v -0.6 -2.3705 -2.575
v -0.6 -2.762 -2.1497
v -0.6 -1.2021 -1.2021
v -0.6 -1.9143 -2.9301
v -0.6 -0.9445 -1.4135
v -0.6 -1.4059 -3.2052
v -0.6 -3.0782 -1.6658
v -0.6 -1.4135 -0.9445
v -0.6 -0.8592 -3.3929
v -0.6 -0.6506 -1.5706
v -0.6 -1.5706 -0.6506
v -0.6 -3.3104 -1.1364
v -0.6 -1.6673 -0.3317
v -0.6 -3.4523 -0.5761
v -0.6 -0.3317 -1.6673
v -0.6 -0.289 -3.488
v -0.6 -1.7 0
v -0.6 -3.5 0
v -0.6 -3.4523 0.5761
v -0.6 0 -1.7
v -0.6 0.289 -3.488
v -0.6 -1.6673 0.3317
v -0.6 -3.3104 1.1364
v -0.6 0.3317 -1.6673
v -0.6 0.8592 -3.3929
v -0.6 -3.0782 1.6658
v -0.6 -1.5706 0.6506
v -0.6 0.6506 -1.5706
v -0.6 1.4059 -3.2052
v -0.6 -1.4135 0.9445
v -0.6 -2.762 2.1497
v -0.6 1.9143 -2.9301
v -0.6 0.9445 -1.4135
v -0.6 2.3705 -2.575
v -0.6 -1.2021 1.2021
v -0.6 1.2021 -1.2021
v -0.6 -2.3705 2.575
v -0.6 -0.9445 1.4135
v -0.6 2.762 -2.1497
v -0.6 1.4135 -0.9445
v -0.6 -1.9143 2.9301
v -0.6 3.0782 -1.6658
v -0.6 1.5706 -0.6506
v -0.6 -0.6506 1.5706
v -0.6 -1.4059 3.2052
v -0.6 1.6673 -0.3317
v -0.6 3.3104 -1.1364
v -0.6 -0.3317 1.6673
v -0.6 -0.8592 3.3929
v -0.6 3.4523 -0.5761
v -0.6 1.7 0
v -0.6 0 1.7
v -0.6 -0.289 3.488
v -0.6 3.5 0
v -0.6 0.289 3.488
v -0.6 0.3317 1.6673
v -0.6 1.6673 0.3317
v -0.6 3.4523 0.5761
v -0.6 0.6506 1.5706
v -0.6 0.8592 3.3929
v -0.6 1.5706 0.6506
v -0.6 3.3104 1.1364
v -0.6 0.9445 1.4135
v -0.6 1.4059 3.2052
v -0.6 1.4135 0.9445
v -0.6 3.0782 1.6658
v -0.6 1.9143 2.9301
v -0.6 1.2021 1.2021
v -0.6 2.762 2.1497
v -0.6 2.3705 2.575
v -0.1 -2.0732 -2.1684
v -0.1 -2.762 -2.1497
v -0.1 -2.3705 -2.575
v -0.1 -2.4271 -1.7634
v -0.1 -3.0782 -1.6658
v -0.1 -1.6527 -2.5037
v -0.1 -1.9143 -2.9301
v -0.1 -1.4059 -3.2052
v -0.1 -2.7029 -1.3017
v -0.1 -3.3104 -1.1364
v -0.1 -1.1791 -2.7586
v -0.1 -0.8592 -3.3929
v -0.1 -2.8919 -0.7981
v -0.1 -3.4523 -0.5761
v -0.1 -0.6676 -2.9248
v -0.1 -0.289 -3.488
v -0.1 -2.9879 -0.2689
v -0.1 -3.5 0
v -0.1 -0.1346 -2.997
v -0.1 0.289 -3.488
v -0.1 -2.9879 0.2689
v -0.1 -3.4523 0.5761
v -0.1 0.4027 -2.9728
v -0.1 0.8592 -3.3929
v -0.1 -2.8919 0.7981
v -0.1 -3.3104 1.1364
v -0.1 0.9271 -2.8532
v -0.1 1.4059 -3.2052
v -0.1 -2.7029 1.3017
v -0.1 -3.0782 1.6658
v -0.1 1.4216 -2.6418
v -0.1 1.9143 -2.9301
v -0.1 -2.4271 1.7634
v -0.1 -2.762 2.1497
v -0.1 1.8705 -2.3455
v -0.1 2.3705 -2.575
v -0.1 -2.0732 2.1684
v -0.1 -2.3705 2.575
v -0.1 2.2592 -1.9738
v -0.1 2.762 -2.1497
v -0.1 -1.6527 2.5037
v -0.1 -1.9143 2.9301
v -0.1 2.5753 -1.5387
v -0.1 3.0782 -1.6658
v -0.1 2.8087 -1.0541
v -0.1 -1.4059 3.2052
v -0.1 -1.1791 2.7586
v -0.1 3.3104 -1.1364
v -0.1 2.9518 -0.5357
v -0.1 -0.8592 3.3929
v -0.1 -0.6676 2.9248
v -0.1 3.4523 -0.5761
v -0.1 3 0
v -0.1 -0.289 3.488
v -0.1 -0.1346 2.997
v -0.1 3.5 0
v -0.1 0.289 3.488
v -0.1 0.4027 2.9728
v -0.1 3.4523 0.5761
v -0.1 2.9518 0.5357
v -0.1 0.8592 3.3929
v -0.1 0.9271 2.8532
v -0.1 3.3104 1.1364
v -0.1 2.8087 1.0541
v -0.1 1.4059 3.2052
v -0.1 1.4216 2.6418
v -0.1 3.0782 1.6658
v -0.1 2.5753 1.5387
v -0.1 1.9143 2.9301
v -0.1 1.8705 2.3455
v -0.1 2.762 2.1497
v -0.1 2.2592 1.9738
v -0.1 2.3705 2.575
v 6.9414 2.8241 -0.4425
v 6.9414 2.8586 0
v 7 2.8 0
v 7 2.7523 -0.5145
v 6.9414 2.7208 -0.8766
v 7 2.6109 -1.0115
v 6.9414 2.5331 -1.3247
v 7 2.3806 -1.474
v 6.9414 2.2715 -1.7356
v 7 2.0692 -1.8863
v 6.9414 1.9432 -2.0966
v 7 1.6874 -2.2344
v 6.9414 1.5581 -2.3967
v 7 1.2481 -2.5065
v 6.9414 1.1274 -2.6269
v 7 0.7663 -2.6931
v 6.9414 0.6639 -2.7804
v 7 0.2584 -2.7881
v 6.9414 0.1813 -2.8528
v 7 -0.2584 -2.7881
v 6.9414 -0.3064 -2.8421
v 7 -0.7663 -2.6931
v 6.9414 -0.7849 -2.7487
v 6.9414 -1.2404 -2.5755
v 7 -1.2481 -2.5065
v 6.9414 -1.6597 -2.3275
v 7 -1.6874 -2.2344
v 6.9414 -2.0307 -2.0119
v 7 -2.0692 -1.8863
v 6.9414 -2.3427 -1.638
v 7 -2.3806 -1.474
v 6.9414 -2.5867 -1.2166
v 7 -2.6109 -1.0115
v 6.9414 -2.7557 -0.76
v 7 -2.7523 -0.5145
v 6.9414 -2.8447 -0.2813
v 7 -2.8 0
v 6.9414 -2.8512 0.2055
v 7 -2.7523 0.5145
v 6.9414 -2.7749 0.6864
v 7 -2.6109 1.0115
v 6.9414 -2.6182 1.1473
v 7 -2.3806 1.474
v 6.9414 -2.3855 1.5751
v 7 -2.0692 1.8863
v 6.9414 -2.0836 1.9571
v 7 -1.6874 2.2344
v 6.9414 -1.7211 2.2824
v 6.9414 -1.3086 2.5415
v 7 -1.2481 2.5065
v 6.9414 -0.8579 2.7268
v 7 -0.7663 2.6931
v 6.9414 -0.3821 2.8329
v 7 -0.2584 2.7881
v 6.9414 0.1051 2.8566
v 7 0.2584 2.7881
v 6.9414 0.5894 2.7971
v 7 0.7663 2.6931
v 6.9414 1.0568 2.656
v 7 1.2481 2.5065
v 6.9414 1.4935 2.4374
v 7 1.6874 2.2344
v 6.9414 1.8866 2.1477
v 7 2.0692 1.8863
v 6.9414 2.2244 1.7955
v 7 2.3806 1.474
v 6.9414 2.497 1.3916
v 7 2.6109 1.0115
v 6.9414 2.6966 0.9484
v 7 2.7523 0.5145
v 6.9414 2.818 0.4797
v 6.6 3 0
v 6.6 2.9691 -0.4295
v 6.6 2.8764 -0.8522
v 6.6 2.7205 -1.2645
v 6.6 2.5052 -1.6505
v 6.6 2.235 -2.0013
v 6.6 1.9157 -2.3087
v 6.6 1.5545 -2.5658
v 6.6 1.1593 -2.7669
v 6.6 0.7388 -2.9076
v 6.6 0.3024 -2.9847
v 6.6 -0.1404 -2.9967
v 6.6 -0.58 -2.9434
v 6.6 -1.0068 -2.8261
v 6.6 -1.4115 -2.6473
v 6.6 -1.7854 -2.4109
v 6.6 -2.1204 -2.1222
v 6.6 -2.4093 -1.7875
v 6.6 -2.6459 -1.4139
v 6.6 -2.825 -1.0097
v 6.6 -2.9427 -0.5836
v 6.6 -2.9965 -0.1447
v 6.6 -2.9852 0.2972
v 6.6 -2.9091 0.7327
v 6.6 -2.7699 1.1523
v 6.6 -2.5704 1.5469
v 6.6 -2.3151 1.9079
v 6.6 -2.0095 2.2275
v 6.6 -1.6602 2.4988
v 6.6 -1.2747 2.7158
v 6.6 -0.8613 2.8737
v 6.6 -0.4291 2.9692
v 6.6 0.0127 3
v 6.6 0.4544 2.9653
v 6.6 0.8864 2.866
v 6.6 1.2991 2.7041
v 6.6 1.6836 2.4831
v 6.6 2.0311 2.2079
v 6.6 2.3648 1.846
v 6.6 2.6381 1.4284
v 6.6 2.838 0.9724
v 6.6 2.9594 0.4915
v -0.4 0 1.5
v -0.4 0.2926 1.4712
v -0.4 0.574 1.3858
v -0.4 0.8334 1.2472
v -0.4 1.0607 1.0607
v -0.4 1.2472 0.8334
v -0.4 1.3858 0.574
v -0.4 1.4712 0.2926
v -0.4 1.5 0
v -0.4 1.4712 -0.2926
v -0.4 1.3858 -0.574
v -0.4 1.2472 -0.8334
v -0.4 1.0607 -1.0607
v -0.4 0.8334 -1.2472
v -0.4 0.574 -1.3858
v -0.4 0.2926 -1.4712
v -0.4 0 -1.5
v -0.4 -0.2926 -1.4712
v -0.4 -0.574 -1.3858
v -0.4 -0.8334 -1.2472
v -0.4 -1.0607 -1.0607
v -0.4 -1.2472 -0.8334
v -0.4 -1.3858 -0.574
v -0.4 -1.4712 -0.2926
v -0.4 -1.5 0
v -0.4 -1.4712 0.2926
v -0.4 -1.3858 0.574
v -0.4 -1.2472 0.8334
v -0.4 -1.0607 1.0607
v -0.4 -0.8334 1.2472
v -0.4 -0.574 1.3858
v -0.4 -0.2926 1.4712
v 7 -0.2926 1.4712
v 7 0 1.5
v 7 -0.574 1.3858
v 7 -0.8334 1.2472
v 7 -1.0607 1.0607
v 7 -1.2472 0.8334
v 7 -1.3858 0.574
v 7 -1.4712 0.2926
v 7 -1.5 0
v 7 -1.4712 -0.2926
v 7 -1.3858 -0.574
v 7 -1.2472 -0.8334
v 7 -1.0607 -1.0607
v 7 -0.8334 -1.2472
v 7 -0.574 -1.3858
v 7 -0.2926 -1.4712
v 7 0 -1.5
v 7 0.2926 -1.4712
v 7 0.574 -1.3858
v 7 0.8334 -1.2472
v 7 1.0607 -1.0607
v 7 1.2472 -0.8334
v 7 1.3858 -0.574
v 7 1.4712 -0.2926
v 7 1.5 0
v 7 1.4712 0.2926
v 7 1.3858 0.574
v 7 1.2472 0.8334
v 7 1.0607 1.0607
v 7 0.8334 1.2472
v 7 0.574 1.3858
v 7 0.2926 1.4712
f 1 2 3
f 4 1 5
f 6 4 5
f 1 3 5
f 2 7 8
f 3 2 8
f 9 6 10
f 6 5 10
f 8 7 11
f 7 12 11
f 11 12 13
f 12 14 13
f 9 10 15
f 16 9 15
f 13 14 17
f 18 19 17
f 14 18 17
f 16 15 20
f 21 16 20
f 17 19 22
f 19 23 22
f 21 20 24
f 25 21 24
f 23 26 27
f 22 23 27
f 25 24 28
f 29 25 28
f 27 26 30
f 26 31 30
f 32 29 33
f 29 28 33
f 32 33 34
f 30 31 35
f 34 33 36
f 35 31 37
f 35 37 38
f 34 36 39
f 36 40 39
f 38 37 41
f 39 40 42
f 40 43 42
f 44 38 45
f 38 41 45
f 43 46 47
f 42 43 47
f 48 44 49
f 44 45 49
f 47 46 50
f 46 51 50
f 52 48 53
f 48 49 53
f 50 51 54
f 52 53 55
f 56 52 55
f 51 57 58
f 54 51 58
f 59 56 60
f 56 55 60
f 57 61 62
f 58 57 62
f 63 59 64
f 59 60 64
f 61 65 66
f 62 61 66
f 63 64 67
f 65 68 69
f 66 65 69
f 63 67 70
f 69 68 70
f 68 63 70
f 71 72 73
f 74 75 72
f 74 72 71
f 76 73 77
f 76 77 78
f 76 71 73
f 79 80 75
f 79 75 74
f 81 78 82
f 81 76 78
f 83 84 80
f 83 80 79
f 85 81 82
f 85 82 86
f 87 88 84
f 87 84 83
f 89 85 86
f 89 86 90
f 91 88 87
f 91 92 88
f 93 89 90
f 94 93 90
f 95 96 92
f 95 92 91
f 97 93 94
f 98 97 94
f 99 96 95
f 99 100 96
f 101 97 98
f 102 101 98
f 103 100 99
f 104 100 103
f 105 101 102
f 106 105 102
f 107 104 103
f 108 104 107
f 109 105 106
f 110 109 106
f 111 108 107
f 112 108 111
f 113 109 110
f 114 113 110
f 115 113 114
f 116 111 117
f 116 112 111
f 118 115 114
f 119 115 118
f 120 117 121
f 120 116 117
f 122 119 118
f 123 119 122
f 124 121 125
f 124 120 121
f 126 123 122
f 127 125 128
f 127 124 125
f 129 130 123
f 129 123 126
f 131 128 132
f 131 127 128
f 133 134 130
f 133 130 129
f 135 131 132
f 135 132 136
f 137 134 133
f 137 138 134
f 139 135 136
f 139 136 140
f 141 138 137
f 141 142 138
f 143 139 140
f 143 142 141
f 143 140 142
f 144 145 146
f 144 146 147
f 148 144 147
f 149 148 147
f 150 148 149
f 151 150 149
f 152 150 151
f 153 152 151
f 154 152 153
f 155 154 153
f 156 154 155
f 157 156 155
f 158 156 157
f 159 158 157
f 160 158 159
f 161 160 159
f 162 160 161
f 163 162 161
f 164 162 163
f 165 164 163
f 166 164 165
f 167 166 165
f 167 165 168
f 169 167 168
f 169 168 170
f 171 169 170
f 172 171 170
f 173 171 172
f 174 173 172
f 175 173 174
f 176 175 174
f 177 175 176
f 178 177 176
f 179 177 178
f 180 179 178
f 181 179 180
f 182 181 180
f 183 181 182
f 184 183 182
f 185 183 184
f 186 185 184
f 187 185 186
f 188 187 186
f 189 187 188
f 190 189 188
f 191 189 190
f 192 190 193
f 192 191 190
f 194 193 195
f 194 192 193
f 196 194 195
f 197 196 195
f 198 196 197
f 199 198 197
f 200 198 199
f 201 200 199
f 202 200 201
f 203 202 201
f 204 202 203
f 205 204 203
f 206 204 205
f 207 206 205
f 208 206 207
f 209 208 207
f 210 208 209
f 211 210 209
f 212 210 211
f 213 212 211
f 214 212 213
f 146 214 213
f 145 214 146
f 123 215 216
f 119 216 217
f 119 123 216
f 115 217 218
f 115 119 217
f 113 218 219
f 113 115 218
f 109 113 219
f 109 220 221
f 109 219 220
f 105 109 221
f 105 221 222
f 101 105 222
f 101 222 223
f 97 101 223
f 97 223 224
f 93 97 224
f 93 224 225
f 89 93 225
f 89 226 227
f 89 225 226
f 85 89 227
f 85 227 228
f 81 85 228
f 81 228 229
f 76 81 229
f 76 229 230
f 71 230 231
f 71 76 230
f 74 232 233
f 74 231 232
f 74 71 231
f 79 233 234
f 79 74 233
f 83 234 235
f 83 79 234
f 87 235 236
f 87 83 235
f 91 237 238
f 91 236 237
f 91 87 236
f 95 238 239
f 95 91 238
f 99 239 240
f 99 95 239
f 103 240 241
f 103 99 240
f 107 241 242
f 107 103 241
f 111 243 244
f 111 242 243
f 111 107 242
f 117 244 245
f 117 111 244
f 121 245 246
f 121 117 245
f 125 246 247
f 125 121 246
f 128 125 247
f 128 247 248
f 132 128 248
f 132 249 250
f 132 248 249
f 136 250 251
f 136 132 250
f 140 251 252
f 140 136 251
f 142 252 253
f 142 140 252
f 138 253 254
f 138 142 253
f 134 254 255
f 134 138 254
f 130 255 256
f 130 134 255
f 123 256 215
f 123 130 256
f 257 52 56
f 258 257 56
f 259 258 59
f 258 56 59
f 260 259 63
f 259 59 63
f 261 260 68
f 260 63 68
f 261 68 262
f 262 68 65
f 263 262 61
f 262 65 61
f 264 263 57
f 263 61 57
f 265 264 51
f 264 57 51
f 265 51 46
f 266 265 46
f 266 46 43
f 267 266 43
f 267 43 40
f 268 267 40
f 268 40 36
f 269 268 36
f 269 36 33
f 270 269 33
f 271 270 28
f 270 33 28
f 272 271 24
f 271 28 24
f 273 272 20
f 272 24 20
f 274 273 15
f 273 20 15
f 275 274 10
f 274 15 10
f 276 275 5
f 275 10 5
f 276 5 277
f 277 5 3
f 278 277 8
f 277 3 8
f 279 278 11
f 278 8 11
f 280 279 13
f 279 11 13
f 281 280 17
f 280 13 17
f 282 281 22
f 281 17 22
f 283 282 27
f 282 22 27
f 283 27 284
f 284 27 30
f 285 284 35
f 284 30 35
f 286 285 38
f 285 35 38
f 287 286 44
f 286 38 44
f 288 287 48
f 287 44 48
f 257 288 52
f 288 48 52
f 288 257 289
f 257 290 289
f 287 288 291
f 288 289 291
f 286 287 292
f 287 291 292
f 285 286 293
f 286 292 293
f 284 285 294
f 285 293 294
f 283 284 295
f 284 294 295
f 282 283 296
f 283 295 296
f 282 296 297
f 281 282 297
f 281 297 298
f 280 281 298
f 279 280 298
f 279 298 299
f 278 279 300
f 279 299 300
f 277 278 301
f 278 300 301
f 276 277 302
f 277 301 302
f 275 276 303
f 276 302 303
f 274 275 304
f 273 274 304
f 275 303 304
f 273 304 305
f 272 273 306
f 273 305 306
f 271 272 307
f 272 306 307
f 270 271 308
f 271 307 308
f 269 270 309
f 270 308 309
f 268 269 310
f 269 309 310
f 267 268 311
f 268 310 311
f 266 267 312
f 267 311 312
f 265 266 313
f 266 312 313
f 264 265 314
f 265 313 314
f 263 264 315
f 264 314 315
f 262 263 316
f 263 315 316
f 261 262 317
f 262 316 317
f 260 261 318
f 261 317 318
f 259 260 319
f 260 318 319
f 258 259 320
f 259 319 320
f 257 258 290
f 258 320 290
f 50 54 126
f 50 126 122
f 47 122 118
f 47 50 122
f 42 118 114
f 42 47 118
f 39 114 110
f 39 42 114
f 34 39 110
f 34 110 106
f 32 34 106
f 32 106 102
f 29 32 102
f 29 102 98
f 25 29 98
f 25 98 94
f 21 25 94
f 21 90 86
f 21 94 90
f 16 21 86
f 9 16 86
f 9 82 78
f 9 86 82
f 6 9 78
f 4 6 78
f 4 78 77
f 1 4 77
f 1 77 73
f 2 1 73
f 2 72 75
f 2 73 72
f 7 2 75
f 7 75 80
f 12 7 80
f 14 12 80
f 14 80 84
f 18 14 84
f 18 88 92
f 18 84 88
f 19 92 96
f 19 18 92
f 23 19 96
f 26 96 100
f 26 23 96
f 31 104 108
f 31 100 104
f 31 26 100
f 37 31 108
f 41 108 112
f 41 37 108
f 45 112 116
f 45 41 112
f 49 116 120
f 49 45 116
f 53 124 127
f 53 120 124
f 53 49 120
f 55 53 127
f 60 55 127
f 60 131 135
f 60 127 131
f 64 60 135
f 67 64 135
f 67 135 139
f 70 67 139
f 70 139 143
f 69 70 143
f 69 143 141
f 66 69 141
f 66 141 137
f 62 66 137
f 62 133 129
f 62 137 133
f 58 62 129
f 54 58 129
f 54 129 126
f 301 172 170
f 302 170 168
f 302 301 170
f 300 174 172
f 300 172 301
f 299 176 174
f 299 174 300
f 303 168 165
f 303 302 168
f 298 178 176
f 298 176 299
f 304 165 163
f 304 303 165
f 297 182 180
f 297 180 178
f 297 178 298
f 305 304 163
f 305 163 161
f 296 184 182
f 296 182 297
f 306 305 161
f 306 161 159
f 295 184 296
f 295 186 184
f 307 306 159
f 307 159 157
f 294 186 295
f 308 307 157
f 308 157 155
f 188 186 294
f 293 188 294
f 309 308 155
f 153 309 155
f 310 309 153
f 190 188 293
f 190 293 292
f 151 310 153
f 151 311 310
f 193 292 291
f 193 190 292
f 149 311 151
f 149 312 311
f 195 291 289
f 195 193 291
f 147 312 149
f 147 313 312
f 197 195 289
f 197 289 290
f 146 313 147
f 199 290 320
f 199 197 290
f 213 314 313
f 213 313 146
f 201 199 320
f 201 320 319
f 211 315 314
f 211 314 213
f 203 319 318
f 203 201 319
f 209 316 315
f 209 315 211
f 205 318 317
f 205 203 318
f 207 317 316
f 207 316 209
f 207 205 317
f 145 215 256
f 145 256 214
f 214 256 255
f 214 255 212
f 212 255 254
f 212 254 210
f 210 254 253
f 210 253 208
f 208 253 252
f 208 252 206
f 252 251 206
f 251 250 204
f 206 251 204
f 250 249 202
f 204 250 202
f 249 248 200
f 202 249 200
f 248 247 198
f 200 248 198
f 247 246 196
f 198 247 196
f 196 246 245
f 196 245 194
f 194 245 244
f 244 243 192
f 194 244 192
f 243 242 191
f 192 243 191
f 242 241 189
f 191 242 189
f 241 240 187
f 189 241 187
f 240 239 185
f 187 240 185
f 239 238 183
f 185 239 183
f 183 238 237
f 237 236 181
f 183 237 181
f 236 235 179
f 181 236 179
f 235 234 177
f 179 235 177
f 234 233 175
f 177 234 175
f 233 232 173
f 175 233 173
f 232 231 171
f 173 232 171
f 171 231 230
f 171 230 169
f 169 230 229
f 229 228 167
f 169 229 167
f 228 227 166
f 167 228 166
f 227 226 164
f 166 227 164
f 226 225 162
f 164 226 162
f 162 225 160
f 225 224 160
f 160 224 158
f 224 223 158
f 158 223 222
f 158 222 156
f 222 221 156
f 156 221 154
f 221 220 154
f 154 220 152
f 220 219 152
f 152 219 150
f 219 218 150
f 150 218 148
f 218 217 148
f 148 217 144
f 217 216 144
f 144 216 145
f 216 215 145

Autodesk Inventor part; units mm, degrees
ref_plane "YZ Plane" through (0, 0, 0) normal (1, 0, 0) x (0, 1, 0)
ref_plane "XZ Plane" through (0, 0, 0) normal (0, 1, 0) x (-1, 0, 0)
ref_plane "XY Plane" through (0, 0, 0) normal (0, 0, 1) x (1, 0, 0)
sketch "Skizze1" plane through (0, 0, 0) normal (0, 0, 1) x (1, 0, 0)
  line L0 (7, -3) -> (0, -3)
  line L1 (7, 3) -> (7, -3) projected
  line L2 (7, 3) -> (0, 3)
  line L3 (7, 1.8) -> (13, 1.8)
  line L4 (7, -1.8) -> (13, -1.8)
  line L5 (0, 3) -> (0, -3) projected
  line L6 (7, 0) -> (7, 3)
  line L7 (0, 3) -> (-0.1, 3)
  line L8 (-0.1, 3) -> (-0.1, 3.5)
  line L9 (-0.1, 3.5) -> (-0.6, 3.5)
  line L10 (-0.6, 3.5) -> (-0.6, 0)
  line L11 (-0.6, 0) -> (7, 0)
  point P0 (0, 0)
  point P1 (0, 0)
  dimension "d0" = 0.1
  dimension "d1" = 0.5
  dimension "d2" = 0.5
  dimension "d24" = 7.6
  dimension "d25" = 3.5
  dimension "d26" = 3
revolve "Umdrehung1" add sketch "Skizze1" angle 360 about axis through (-0.6, 0, 0) along (1, 0, 0) contours L11 L10 L9 L8 L7 L5 | L5 L2 L1 L11
sketch "Skizze3" plane through (-0.6, 0, 0) normal (-1, 0, 0) x (0, 0, 1)
  point P0 (0, 0)
chamfer "Fase1" distance 0.2 angle 45 1 edges at (7, -3, 0)
chamfer "Fase2" distance 0.2 angle 45 1 edges at (6.8, -3, 0)
hole "Bohrung2" at (-0.6, 0, 0) direction (1, 0, 0) diameter 3 end through all
chamfer "Fase3" distance 0.2 angle 45 1 edges at (-0.6, 0, -1.5)
properties part number "Hülse1"
